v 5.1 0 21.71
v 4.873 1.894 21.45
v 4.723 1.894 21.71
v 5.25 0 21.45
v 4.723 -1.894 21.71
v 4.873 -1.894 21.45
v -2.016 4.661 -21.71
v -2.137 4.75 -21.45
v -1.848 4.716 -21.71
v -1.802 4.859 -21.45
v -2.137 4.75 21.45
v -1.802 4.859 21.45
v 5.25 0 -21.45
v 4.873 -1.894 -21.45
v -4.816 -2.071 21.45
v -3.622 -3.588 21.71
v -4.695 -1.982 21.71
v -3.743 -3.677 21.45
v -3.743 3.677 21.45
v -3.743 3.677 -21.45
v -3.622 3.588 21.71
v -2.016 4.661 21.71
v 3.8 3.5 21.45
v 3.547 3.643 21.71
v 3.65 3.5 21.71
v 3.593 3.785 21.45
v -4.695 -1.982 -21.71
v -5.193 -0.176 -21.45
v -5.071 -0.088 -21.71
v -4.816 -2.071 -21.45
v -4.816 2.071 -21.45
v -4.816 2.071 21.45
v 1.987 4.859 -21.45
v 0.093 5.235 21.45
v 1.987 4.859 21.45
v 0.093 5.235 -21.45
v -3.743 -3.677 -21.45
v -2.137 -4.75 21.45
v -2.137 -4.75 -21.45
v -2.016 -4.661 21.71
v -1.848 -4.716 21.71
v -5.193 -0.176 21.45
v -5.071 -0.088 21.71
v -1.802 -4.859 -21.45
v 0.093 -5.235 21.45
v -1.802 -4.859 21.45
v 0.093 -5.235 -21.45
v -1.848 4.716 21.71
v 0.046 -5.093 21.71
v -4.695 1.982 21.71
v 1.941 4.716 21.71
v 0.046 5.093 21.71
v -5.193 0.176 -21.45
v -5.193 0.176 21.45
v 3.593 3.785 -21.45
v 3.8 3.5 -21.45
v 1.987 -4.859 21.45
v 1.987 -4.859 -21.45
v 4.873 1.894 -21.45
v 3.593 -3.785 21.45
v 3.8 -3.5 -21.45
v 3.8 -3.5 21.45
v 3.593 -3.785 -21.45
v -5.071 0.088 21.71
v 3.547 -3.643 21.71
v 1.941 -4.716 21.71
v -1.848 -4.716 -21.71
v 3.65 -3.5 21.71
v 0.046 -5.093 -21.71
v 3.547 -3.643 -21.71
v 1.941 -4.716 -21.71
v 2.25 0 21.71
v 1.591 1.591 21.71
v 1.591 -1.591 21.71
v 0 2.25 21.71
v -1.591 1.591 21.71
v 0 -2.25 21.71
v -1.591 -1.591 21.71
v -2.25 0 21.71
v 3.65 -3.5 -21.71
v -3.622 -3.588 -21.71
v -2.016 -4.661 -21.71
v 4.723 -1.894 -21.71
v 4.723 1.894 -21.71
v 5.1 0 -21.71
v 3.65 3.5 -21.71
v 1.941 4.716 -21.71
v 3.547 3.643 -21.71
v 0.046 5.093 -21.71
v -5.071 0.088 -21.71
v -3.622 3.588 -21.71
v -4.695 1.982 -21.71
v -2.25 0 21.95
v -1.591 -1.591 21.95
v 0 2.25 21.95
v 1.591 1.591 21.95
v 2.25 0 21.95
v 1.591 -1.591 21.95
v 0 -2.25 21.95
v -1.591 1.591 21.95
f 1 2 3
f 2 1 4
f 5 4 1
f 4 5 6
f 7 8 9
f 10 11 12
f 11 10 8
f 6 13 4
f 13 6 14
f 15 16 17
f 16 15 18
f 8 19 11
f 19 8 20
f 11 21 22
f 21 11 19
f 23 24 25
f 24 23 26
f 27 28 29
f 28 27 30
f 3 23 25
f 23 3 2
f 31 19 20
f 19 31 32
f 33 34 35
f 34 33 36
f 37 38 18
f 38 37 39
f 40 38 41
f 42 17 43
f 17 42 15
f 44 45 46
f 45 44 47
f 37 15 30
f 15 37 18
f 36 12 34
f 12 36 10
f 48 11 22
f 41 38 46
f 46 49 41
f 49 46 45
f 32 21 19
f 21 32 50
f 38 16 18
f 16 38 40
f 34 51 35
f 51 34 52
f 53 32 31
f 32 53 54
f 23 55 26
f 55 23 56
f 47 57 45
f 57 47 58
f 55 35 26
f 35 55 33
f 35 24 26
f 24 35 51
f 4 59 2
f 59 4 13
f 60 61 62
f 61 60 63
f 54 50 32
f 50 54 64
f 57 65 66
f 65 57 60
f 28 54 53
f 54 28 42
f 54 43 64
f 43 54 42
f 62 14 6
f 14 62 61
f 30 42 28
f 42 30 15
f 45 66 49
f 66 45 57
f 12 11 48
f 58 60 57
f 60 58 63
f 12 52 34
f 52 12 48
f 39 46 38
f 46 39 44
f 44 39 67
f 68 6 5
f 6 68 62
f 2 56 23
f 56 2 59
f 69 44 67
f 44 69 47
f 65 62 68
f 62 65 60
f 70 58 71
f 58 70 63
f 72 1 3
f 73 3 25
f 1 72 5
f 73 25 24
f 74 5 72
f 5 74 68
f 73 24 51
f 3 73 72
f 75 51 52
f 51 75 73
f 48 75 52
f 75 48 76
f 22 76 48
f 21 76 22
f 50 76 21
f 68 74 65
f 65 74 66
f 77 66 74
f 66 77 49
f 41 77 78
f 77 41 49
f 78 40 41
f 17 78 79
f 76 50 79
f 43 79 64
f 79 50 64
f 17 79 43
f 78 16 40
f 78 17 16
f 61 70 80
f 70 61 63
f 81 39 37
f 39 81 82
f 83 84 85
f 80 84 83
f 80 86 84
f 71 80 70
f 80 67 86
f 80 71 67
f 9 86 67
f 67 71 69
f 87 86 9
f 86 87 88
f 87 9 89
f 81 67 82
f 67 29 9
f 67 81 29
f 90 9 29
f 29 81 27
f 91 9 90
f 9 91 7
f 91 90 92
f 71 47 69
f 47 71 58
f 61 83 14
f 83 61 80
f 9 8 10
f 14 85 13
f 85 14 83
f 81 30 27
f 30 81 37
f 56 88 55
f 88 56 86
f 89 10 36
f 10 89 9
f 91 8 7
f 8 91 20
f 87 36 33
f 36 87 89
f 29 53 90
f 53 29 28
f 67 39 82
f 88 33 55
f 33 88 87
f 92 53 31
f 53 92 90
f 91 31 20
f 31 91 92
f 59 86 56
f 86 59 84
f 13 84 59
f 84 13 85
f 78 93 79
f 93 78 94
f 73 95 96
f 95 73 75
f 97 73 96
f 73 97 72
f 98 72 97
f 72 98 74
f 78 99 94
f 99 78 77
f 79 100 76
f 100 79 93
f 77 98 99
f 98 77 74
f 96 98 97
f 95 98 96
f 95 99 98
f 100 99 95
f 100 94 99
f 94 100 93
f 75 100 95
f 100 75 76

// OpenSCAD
// Parameters
overall_height_mm = 44.5; //[22.25:89:0.1]
outer_diameter_mm = 10.5; //[5.25:21:0.1]
body_diameter_mm = 10.5; //[5.25:21:0.1]
body_height_mm = 43.5; //[21.75:87:0.1]
positive_terminal_height_mm = 1; //[0.5:2:0.05]
positive_terminal_diameter_mm = 4.5; //[2.25:9:0.1]
negative_terminal_height_mm = 0.2; //[0.1:0.6:0.05]
negative_terminal_diameter_mm = 6; //[3:12:0.1]
edge_fillet_radius_mm = 0.3; //[0.15:0.8:0.05]
terminal_overlap_mm = 0.8; //[0.5:2:0.1]
minkowski_sphere_radius_mm = 0.3; //[0.15:0.8:0.05]

// AAACELL - complete geometry
module AAACELL() {
  color([0.85, 0.85, 0.8]) {
    // Cylindrical cell body with edge fillet
    minkowski() {
      cylinder(r=body_diameter_mm/2 - minkowski_sphere_radius_mm, 
               h=body_height_mm - 2*minkowski_sphere_radius_mm, center=true);
      sphere(r=minkowski_sphere_radius_mm, center=true);
    }
    
    // Positive terminal button
    translate([0, 0, body_height_mm/2 + positive_terminal_height_mm/2 - terminal_overlap_mm])
      cylinder(r=positive_terminal_diameter_mm/2, h=positive_terminal_height_mm, center=true);
    
    // Negative terminal contact
    translate([0, 0, -body_height_mm/2 - negative_terminal_height_mm/2 + terminal_overlap_mm])
      cylinder(r=negative_terminal_diameter_mm/2, h=negative_terminal_height_mm, center=true);
  }
}

// Assembly
module assembly() {
  AAACELL();
}

assembly();
